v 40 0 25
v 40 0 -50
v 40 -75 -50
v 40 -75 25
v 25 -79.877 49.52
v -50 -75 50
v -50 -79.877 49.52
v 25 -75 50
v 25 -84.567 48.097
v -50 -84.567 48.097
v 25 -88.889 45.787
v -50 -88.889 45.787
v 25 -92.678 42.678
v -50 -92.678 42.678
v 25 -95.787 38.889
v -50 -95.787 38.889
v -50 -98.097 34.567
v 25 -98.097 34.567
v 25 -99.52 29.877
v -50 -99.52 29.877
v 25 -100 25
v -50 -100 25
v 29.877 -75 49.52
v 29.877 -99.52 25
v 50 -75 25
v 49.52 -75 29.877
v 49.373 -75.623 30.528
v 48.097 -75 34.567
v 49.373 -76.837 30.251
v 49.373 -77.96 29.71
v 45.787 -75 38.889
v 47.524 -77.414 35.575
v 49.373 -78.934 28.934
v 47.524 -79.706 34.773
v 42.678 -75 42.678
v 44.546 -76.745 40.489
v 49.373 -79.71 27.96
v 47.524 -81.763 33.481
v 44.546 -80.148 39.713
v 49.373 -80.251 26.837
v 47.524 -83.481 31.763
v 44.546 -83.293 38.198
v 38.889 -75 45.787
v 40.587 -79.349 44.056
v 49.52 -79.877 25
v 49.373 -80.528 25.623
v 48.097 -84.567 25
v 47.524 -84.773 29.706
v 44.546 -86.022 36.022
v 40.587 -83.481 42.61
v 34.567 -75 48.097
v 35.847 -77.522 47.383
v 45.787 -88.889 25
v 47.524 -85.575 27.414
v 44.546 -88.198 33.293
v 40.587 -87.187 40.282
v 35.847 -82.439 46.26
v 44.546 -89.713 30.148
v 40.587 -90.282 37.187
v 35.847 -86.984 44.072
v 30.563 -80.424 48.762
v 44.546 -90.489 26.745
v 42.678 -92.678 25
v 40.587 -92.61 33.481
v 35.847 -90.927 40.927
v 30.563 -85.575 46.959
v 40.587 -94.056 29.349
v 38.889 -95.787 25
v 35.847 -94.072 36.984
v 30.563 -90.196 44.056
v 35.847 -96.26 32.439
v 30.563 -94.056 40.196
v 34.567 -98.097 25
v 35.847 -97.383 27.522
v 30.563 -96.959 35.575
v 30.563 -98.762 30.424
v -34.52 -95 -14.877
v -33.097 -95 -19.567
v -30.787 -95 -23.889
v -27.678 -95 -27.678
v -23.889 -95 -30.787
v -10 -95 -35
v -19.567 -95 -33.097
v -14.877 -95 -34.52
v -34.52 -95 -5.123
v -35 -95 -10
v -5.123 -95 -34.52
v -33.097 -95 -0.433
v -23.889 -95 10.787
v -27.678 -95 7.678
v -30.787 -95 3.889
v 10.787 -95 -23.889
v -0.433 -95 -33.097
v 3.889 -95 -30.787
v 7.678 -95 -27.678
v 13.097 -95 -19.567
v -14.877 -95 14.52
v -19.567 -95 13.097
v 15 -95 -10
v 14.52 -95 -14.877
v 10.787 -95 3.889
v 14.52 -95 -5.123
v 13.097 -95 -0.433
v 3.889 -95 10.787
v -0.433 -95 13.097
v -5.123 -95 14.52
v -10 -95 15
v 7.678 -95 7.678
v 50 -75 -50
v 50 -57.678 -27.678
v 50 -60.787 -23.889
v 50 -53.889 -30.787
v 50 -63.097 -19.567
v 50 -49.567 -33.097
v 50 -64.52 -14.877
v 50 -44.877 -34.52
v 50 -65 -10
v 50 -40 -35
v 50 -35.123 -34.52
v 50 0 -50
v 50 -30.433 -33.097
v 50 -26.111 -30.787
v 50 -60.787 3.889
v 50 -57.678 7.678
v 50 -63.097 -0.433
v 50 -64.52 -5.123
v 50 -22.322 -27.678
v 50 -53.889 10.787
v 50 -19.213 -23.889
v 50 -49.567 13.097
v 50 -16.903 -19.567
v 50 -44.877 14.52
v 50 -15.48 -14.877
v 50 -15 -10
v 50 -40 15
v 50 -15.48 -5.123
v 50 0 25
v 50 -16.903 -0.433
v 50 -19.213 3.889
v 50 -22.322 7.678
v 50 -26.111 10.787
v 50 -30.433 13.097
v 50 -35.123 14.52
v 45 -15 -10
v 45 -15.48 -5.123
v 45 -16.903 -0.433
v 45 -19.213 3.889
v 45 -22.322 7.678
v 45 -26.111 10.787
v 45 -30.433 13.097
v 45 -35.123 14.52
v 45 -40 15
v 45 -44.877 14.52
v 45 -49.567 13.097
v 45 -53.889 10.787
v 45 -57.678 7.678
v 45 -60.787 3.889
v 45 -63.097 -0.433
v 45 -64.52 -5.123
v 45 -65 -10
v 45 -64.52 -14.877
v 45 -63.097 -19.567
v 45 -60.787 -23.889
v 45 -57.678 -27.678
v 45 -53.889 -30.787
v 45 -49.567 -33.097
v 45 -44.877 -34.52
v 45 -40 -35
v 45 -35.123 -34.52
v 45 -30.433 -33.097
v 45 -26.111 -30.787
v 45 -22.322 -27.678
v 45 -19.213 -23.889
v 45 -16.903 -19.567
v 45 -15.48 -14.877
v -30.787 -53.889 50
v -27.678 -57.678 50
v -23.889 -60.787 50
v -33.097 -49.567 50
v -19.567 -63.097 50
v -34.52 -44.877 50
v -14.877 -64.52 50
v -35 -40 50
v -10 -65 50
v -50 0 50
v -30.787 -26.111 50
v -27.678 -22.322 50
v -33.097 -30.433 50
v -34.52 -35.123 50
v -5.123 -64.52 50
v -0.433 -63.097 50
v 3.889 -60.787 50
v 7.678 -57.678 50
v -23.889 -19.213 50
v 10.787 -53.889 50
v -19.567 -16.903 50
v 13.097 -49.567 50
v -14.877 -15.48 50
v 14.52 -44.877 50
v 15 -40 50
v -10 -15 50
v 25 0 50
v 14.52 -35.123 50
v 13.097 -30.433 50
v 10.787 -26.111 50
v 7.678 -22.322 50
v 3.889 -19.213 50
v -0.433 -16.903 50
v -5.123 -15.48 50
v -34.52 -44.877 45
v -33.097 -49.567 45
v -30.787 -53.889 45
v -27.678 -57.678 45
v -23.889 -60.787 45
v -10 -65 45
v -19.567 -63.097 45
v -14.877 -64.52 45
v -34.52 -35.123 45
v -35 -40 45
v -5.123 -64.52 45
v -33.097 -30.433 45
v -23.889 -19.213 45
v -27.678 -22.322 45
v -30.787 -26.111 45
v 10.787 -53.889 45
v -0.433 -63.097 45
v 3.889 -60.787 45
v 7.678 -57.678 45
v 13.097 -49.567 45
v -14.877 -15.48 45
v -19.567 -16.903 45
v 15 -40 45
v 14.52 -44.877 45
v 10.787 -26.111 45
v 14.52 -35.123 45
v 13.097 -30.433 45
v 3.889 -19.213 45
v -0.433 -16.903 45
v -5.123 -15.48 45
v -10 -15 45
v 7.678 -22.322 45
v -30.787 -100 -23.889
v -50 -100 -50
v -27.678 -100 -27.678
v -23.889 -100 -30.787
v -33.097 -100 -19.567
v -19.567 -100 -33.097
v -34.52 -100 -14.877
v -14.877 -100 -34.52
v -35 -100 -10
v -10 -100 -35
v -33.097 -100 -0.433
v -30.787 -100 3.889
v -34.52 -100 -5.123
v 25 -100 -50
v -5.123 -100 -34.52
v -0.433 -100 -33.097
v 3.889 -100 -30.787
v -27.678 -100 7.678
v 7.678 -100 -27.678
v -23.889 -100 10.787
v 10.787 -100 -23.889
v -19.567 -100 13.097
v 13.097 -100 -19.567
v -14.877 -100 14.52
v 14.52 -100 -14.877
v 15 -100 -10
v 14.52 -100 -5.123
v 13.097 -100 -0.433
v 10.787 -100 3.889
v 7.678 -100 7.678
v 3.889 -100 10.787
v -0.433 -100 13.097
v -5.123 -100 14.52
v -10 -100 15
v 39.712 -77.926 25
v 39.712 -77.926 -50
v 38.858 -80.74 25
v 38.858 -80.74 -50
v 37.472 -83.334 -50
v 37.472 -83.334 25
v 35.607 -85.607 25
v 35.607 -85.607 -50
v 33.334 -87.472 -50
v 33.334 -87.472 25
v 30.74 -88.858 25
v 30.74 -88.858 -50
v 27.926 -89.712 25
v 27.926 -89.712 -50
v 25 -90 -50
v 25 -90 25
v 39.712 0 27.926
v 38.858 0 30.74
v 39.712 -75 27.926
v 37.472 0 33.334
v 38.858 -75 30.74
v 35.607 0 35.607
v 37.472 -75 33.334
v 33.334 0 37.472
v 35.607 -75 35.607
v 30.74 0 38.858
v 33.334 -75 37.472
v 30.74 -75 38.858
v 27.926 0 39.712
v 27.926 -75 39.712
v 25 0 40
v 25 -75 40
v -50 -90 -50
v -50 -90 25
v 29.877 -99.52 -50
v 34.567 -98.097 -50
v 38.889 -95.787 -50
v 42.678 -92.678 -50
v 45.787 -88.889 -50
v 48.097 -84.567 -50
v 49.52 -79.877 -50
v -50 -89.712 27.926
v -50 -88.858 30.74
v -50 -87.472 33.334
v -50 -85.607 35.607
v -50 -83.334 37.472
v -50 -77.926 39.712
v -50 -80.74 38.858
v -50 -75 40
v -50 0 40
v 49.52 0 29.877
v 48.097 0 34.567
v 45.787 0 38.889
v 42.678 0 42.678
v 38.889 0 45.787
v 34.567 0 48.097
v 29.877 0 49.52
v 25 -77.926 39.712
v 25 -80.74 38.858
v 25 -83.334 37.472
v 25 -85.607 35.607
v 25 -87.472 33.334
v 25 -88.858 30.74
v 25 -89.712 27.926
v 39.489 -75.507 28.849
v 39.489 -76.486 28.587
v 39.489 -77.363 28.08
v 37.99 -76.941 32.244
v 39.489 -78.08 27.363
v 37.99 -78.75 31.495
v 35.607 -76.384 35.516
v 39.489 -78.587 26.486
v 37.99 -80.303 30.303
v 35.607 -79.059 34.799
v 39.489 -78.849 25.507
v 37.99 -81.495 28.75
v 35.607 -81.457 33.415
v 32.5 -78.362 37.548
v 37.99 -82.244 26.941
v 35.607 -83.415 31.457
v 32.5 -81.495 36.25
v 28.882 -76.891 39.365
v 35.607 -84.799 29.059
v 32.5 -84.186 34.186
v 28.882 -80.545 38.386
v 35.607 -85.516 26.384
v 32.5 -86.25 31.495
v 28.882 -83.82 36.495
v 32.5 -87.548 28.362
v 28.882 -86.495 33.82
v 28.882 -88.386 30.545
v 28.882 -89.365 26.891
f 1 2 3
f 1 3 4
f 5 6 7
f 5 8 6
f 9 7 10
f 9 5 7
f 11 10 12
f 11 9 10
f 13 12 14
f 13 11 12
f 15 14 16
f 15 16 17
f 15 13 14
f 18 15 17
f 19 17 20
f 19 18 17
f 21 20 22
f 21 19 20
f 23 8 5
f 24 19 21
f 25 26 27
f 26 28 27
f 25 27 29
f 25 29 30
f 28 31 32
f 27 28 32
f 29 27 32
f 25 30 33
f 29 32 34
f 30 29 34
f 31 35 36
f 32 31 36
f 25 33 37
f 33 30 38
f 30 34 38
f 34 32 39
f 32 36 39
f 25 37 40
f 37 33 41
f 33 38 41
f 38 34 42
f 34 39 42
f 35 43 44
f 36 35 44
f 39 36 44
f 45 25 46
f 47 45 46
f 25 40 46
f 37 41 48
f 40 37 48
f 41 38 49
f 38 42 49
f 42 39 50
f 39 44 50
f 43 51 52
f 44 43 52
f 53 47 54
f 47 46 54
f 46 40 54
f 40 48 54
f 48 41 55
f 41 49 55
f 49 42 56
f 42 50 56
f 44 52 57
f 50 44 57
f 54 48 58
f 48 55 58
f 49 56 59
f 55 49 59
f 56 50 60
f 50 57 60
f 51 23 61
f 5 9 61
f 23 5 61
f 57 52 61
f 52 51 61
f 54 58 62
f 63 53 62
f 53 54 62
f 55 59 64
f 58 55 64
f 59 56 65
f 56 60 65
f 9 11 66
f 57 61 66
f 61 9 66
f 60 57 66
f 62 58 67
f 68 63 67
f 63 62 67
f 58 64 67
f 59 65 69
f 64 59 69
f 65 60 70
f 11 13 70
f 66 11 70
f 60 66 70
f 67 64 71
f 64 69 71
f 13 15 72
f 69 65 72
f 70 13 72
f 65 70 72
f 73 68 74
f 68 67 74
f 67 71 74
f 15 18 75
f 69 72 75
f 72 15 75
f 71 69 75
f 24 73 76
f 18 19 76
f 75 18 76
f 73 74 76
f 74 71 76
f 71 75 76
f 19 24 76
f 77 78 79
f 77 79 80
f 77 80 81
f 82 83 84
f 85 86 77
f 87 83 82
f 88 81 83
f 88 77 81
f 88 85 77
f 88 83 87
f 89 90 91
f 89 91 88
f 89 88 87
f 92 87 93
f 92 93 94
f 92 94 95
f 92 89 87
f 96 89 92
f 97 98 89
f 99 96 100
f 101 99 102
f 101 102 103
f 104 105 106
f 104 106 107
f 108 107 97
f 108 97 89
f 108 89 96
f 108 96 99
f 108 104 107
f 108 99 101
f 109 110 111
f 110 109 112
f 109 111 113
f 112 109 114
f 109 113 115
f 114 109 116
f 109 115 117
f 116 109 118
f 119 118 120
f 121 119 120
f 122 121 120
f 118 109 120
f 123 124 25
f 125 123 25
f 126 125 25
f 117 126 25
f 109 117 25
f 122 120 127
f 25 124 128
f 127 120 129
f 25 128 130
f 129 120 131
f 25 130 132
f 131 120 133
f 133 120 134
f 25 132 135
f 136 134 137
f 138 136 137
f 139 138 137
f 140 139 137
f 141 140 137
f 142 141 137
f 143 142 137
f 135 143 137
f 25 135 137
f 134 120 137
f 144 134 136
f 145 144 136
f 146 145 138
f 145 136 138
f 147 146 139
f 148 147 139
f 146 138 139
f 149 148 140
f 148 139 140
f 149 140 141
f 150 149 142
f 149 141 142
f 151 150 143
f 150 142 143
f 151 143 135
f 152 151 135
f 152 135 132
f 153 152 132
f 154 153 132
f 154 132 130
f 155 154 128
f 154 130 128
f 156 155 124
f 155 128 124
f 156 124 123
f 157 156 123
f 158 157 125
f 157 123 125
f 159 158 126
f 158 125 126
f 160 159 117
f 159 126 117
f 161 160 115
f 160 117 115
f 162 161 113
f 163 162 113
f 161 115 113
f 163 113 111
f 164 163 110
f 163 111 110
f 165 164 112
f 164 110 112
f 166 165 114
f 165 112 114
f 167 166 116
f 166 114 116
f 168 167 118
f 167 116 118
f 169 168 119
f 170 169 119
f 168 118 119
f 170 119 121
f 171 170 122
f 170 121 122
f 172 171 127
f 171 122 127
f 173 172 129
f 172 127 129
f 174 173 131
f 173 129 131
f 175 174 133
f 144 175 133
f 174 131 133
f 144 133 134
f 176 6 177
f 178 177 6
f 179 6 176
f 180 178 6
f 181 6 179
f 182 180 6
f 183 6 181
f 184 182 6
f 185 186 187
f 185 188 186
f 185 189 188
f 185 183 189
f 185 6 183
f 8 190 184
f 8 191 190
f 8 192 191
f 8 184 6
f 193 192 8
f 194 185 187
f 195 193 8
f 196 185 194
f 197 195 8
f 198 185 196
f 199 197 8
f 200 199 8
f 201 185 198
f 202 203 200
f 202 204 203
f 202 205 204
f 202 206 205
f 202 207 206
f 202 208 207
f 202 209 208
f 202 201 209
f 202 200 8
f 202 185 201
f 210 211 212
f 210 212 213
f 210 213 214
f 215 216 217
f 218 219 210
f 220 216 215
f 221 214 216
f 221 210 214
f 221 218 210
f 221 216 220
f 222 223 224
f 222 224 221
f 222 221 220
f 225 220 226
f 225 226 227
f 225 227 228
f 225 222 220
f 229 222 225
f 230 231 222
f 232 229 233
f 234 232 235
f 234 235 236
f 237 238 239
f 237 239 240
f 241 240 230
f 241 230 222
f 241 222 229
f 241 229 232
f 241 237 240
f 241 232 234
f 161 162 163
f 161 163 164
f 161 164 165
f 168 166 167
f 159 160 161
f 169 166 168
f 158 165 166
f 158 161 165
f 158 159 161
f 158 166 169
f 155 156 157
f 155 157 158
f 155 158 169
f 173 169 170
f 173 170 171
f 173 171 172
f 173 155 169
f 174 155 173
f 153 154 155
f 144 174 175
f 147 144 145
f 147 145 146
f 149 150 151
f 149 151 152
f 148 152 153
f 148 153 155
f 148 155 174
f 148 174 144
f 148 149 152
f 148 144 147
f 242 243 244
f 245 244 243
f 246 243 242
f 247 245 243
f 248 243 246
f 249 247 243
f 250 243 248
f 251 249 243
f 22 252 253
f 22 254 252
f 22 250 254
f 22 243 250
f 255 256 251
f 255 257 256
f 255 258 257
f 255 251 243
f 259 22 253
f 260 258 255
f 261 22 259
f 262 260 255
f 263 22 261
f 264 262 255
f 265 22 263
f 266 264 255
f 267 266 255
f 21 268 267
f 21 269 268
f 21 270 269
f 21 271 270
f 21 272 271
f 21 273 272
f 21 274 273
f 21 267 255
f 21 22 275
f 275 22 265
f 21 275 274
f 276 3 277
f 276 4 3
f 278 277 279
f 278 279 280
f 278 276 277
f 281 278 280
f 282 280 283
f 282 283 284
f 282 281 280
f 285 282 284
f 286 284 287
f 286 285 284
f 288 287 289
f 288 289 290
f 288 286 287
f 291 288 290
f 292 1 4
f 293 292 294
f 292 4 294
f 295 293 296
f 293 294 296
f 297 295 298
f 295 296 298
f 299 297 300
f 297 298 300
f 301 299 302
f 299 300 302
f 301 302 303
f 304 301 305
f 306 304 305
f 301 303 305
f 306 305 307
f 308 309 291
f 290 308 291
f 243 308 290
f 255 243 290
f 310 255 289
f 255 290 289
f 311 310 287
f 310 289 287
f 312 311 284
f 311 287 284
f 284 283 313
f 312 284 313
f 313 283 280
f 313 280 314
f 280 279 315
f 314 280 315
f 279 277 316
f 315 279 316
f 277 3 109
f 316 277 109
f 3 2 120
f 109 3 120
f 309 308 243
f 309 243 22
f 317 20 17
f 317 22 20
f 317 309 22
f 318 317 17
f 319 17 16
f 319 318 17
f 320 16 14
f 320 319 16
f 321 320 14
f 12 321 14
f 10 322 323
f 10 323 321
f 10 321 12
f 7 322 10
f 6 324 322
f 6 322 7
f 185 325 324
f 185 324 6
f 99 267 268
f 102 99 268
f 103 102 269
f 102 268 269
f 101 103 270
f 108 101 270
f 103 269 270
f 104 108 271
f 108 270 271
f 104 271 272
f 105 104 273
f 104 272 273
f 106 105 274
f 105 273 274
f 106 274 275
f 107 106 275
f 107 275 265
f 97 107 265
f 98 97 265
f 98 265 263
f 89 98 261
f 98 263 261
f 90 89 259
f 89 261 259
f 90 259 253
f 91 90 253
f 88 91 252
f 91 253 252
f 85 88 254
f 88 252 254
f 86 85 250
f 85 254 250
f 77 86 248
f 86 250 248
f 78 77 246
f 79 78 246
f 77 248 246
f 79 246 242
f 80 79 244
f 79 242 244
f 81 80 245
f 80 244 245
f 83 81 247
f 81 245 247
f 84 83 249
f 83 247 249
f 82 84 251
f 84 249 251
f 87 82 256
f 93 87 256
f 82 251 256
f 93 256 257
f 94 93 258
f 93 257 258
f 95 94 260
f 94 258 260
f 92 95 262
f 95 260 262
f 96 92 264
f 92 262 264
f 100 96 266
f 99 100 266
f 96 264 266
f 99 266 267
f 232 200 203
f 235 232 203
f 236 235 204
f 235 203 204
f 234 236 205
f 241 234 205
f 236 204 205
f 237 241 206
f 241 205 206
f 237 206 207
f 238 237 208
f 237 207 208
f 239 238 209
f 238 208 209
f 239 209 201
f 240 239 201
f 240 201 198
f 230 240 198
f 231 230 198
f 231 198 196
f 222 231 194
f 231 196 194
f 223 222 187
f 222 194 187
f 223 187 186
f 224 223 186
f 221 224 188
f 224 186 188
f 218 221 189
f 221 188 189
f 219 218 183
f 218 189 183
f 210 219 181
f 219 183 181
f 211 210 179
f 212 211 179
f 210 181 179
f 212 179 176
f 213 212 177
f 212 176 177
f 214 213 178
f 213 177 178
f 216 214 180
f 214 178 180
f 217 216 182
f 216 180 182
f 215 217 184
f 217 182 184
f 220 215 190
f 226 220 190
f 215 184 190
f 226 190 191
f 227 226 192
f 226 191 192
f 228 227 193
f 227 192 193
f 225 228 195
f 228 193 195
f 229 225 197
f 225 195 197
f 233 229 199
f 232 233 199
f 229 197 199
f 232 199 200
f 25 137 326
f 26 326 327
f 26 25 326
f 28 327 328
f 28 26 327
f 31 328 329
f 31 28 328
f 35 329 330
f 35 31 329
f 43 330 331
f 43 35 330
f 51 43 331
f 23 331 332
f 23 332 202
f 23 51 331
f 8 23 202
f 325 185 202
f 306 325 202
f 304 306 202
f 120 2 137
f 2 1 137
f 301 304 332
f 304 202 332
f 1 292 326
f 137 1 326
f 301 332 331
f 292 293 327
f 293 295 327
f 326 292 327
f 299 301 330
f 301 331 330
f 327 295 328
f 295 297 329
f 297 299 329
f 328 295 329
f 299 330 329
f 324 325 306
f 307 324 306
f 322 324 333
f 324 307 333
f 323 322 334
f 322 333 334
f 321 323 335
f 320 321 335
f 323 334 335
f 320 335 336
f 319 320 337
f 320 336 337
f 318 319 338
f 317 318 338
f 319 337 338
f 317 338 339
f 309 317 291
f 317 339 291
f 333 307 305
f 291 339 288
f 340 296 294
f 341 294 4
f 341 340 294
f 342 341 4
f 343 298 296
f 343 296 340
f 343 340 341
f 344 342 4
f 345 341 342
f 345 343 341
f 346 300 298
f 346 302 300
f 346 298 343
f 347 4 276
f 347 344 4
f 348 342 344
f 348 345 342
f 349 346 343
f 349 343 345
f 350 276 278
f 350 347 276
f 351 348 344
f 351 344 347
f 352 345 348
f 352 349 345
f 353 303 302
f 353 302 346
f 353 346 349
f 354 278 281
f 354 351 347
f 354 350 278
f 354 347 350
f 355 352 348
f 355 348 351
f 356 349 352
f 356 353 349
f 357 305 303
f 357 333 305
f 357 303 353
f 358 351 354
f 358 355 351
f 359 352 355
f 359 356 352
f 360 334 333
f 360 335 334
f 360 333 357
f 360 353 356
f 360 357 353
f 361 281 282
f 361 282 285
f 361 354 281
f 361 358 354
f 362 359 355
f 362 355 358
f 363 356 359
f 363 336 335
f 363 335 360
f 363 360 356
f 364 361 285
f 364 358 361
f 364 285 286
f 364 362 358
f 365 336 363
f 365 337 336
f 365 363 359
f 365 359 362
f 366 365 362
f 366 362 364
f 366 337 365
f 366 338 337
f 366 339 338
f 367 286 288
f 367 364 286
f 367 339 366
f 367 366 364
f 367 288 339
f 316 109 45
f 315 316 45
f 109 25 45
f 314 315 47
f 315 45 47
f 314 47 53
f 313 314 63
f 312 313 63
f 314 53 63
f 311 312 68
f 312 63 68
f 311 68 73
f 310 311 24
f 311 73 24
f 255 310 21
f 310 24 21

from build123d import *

# Parameters (mm, degrees)
F0_W     = 100
F0_H     = 100
F1_DEPTH = 100
F2_R     = 25
F3_T     = -10
F4_R     = 25
F5_DEPTH = 5
F6_R     = 25
F7_DEPTH = 5
F8_R     = 25
F9_DEPTH = 5


with BuildPart() as f1:
    # F0 (on Front) → F1 (new body)
    with BuildSketch(Plane.XZ):
        Rectangle(F0_W, F0_H)
    extrude(amount=F1_DEPTH)

    # F2
    f2_edges = [f1.edges().sort_by_distance(p)[0] for p in [
        (0, -100, 50),
        (50, -50, 50),
        (50, -100, 0),
    ]]
    fillet(f2_edges, radius=F2_R)

    # F3
    f3_openings = [f1.faces().sort_by_distance(p)[0] for p in [
        (-50, -49.396169, -0.603831),
        (-0.603831, 0, -0.603831),
        (-0.603831, -49.396169, -50),
    ]]
    offset(amount=F3_T, openings=f3_openings)

    # F4 (on face) → F5 (cut)
    with BuildSketch(Plane.XZ.offset(100)):
        with Locations((-10, -10)):
            Circle(F4_R)
    extrude(amount=-F5_DEPTH, mode=Mode.SUBTRACT)

    # F6 (on face) → F7 (cut)
    with BuildSketch(Plane.YZ.offset(50)):
        with Locations((-40, -10)):
            Circle(F6_R)
    extrude(amount=-F7_DEPTH, mode=Mode.SUBTRACT)

    # F8 (on face) → F9 (cut)
    with BuildSketch(Plane.XY.offset(50)):
        with Locations((-10, -40)):
            Circle(F8_R)
    extrude(amount=-F9_DEPTH, mode=Mode.SUBTRACT)


solid = f1.part
